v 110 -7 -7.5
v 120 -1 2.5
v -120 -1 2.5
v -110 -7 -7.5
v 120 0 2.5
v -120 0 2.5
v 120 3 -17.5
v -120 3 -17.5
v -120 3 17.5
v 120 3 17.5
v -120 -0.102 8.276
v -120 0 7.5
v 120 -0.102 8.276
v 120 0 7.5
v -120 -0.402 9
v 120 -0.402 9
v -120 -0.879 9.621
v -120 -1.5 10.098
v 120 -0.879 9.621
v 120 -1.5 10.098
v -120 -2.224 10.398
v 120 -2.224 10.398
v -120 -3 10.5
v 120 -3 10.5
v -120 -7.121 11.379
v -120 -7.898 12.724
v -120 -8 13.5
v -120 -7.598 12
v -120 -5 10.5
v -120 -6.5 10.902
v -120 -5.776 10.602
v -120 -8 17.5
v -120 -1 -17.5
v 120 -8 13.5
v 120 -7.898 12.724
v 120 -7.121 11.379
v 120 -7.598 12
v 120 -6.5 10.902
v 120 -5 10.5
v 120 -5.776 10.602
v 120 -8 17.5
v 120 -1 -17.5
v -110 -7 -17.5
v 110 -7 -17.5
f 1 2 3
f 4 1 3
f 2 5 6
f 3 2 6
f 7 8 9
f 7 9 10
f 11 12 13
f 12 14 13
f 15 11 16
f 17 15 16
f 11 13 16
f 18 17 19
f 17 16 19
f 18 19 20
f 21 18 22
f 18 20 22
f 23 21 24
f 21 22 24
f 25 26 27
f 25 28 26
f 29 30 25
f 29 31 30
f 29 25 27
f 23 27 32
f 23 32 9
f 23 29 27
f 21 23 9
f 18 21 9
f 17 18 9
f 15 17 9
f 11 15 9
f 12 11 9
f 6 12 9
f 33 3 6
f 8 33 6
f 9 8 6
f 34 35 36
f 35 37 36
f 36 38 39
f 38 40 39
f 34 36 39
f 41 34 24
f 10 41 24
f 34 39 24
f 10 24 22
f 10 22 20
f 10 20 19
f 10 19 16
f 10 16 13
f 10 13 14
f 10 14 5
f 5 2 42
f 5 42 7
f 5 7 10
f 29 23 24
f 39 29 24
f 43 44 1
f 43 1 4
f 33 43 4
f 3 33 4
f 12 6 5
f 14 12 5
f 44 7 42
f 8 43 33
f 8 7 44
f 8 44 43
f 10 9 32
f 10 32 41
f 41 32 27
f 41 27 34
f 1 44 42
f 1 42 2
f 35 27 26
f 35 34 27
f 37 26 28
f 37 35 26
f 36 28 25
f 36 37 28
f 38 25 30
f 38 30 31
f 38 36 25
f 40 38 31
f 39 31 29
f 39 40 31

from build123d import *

# Parameters (mm, degrees)
SKETCH1_W           = 240
SKETCH1_H           = 35
BOSS_EXTRUDE1_DEPTH = 3
SKETCH3_W           = 240
SKETCH3_H           = 7
BOSS_EXTRUDE3_DEPTH = 8
FILLET1_R           = 3
SKETCH4_W           = 240
SKETCH4_H           = 7
BOSS_EXTRUDE5_DEPTH = 20
CHAMFER1_SIZE       = 10
CHAMFER1_SIZE2      = 6


with BuildPart() as part:
    # Sketch1 → Boss-Extrude1 (new body)
    with BuildSketch(Plane(origin=(0, 0, 0), x_dir=(1, 0, 0), z_dir=(0, 1, 0))):
        Rectangle(SKETCH1_W, SKETCH1_H)
    extrude(amount=BOSS_EXTRUDE1_DEPTH)

    # Sketch3 → Boss-Extrude3 (add)
    with BuildSketch(Plane.XZ):
        with Locations((0, 14)):
            Rectangle(SKETCH3_W, SKETCH3_H)
    extrude(amount=BOSS_EXTRUDE3_DEPTH)

    # Fillet1
    fillet1_edges = [part.edges().sort_by_distance(p)[0] for p in [
        (0, 0, 10.5),
        (0, -8, 10.5),
    ]]
    fillet(fillet1_edges, radius=FILLET1_R)

    # Sketch4 → Boss-Extrude5 (add)
    with BuildSketch(Plane(origin=(0, 0, -17.5), x_dir=(-1, 0, 0), z_dir=(0, 0, -1))):
        with Locations((0, -3.5)):
            Rectangle(SKETCH4_W, SKETCH4_H)
    extrude(amount=-BOSS_EXTRUDE5_DEPTH)

    # Chamfer1
    chamfer1_edges = [part.edges().sort_by_distance(p)[0] for p in [
        (0, -7, 2.5),
        (-120, -7, -7.5),
        (120, -7, -7.5),
    ]]
    chamfer1_side = [part.faces().sort_by_distance(p)[0] for p in [
        (0, -7, -7.5),
    ]]
    chamfer(chamfer1_edges, length=CHAMFER1_SIZE, length2=CHAMFER1_SIZE2, reference=chamfer1_side[0])


solid = part.part
